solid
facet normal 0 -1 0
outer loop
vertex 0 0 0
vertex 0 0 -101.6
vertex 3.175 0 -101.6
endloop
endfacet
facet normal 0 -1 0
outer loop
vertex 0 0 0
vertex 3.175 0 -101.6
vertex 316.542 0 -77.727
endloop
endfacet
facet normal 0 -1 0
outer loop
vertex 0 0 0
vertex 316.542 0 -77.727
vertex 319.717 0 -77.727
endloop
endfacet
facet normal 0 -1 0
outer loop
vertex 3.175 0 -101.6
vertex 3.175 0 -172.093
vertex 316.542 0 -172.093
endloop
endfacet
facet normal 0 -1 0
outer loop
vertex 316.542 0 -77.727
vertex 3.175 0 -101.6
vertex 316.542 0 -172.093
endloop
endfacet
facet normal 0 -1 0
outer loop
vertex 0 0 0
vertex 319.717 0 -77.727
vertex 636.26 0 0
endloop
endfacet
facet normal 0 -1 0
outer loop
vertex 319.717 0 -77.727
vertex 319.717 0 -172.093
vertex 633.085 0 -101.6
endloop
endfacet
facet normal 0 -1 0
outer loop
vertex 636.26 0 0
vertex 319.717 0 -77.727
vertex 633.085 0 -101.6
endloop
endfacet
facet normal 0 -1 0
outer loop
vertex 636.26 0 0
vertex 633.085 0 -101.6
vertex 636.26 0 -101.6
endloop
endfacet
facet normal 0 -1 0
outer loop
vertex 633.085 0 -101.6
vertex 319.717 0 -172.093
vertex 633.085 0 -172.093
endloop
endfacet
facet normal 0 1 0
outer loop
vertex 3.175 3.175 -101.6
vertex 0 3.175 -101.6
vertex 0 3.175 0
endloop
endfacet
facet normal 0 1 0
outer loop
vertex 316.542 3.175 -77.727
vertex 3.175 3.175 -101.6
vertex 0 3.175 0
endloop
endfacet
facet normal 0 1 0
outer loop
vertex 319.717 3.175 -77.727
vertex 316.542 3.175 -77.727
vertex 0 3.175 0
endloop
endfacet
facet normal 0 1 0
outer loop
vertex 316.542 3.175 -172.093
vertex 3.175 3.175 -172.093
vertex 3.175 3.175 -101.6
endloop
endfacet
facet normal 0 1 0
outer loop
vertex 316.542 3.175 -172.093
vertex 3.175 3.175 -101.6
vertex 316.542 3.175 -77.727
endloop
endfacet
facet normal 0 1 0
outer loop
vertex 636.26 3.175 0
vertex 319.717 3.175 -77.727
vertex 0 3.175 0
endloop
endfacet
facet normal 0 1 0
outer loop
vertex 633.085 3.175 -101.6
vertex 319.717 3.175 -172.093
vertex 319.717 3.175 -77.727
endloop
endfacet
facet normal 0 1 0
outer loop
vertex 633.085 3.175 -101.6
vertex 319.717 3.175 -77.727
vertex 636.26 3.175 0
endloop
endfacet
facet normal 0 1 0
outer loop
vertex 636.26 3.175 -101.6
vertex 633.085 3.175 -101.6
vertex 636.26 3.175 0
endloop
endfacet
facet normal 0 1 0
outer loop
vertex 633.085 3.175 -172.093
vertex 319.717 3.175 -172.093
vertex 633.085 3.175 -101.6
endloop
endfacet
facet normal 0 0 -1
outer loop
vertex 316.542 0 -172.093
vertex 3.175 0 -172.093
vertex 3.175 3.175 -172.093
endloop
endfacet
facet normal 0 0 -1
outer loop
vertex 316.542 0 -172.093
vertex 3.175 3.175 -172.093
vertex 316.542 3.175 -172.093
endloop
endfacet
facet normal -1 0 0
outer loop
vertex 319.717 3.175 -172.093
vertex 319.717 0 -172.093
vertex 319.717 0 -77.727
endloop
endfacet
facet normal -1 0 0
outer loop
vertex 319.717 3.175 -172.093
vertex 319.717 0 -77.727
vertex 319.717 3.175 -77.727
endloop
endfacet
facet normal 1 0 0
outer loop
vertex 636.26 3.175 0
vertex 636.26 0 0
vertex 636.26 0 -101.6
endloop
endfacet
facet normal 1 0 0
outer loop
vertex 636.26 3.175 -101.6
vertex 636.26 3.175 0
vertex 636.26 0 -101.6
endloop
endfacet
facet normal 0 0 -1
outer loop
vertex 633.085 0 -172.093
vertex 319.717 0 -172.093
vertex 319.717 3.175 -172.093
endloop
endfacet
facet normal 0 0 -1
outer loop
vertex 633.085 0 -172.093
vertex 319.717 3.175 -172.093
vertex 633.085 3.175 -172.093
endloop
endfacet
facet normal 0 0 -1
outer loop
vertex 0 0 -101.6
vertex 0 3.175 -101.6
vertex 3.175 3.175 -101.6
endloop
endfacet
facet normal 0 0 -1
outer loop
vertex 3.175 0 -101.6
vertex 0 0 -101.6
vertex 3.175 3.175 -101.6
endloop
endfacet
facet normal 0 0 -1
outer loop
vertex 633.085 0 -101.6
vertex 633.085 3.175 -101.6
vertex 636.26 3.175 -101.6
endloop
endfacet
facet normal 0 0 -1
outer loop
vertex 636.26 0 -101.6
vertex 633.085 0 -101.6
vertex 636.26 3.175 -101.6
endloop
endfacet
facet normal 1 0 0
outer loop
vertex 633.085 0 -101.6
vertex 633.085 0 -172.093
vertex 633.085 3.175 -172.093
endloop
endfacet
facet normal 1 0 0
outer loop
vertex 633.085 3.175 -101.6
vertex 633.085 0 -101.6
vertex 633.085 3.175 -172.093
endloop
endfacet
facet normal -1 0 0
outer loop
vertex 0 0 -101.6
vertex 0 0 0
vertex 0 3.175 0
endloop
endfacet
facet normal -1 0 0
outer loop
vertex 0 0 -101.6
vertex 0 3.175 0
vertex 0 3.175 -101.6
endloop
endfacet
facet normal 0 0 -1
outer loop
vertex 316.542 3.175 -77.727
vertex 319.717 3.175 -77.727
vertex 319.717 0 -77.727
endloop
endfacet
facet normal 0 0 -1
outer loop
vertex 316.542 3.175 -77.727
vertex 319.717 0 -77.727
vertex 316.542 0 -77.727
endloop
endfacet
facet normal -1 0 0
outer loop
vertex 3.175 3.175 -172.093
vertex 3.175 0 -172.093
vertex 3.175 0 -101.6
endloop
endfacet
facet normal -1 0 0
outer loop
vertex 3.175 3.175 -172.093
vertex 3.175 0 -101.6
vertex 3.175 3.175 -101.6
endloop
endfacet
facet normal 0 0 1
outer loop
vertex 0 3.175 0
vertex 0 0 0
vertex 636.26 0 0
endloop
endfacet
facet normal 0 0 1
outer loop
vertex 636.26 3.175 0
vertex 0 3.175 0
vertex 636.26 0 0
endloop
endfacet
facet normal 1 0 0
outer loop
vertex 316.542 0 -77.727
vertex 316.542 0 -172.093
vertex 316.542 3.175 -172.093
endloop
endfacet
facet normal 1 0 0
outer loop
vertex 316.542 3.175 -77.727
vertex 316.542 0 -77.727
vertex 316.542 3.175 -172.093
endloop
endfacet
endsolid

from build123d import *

# Parameters (mm, degrees)
SKETCH1_W           = 636.25984
SKETCH1_H           = 172.09262
BOSS_EXTRUDE1_DEPTH = 3.175
SKETCH2_W           = 3.175
SKETCH2_H           = 3.175
CUT_EXTRUDE1_DEPTH  = 94.36608
SKETCH3_W           = 3.175
SKETCH3_H           = 3.175
CUT_EXTRUDE5_DEPTH  = 70.49262


with BuildPart() as part:
    # Sketch1 → Boss-Extrude1 (new body)
    with BuildSketch(Plane(origin=(0, 0, 0), x_dir=(1, 0, 0), z_dir=(0, 1, 0))):
        with Locations((318.12992, 86.04631)):
            Rectangle(SKETCH1_W, SKETCH1_H)
    extrude(amount=BOSS_EXTRUDE1_DEPTH)

    # Sketch2 → Cut-Extrude1 (cut)
    with BuildSketch(Plane(origin=(0, 0, -172.09262), x_dir=(-1, 0, 0), z_dir=(0, 0, -1))):
        with Locations((-318.12992, 1.5875)):
            Rectangle(SKETCH2_W, SKETCH2_H)
    extrude(amount=-CUT_EXTRUDE1_DEPTH, mode=Mode.SUBTRACT)

    # Sketch3 → Cut-Extrude5 (cut)
    with BuildSketch(Plane.XY.offset(-172.09262)):
        with Locations((1.5875, 1.5875)):
            Rectangle(SKETCH3_W, SKETCH3_H)
        with Locations((634.67234, 1.5875)):
            Rectangle(SKETCH3_W, SKETCH3_H)
    extrude(amount=CUT_EXTRUDE5_DEPTH, mode=Mode.SUBTRACT)


solid = part.part
